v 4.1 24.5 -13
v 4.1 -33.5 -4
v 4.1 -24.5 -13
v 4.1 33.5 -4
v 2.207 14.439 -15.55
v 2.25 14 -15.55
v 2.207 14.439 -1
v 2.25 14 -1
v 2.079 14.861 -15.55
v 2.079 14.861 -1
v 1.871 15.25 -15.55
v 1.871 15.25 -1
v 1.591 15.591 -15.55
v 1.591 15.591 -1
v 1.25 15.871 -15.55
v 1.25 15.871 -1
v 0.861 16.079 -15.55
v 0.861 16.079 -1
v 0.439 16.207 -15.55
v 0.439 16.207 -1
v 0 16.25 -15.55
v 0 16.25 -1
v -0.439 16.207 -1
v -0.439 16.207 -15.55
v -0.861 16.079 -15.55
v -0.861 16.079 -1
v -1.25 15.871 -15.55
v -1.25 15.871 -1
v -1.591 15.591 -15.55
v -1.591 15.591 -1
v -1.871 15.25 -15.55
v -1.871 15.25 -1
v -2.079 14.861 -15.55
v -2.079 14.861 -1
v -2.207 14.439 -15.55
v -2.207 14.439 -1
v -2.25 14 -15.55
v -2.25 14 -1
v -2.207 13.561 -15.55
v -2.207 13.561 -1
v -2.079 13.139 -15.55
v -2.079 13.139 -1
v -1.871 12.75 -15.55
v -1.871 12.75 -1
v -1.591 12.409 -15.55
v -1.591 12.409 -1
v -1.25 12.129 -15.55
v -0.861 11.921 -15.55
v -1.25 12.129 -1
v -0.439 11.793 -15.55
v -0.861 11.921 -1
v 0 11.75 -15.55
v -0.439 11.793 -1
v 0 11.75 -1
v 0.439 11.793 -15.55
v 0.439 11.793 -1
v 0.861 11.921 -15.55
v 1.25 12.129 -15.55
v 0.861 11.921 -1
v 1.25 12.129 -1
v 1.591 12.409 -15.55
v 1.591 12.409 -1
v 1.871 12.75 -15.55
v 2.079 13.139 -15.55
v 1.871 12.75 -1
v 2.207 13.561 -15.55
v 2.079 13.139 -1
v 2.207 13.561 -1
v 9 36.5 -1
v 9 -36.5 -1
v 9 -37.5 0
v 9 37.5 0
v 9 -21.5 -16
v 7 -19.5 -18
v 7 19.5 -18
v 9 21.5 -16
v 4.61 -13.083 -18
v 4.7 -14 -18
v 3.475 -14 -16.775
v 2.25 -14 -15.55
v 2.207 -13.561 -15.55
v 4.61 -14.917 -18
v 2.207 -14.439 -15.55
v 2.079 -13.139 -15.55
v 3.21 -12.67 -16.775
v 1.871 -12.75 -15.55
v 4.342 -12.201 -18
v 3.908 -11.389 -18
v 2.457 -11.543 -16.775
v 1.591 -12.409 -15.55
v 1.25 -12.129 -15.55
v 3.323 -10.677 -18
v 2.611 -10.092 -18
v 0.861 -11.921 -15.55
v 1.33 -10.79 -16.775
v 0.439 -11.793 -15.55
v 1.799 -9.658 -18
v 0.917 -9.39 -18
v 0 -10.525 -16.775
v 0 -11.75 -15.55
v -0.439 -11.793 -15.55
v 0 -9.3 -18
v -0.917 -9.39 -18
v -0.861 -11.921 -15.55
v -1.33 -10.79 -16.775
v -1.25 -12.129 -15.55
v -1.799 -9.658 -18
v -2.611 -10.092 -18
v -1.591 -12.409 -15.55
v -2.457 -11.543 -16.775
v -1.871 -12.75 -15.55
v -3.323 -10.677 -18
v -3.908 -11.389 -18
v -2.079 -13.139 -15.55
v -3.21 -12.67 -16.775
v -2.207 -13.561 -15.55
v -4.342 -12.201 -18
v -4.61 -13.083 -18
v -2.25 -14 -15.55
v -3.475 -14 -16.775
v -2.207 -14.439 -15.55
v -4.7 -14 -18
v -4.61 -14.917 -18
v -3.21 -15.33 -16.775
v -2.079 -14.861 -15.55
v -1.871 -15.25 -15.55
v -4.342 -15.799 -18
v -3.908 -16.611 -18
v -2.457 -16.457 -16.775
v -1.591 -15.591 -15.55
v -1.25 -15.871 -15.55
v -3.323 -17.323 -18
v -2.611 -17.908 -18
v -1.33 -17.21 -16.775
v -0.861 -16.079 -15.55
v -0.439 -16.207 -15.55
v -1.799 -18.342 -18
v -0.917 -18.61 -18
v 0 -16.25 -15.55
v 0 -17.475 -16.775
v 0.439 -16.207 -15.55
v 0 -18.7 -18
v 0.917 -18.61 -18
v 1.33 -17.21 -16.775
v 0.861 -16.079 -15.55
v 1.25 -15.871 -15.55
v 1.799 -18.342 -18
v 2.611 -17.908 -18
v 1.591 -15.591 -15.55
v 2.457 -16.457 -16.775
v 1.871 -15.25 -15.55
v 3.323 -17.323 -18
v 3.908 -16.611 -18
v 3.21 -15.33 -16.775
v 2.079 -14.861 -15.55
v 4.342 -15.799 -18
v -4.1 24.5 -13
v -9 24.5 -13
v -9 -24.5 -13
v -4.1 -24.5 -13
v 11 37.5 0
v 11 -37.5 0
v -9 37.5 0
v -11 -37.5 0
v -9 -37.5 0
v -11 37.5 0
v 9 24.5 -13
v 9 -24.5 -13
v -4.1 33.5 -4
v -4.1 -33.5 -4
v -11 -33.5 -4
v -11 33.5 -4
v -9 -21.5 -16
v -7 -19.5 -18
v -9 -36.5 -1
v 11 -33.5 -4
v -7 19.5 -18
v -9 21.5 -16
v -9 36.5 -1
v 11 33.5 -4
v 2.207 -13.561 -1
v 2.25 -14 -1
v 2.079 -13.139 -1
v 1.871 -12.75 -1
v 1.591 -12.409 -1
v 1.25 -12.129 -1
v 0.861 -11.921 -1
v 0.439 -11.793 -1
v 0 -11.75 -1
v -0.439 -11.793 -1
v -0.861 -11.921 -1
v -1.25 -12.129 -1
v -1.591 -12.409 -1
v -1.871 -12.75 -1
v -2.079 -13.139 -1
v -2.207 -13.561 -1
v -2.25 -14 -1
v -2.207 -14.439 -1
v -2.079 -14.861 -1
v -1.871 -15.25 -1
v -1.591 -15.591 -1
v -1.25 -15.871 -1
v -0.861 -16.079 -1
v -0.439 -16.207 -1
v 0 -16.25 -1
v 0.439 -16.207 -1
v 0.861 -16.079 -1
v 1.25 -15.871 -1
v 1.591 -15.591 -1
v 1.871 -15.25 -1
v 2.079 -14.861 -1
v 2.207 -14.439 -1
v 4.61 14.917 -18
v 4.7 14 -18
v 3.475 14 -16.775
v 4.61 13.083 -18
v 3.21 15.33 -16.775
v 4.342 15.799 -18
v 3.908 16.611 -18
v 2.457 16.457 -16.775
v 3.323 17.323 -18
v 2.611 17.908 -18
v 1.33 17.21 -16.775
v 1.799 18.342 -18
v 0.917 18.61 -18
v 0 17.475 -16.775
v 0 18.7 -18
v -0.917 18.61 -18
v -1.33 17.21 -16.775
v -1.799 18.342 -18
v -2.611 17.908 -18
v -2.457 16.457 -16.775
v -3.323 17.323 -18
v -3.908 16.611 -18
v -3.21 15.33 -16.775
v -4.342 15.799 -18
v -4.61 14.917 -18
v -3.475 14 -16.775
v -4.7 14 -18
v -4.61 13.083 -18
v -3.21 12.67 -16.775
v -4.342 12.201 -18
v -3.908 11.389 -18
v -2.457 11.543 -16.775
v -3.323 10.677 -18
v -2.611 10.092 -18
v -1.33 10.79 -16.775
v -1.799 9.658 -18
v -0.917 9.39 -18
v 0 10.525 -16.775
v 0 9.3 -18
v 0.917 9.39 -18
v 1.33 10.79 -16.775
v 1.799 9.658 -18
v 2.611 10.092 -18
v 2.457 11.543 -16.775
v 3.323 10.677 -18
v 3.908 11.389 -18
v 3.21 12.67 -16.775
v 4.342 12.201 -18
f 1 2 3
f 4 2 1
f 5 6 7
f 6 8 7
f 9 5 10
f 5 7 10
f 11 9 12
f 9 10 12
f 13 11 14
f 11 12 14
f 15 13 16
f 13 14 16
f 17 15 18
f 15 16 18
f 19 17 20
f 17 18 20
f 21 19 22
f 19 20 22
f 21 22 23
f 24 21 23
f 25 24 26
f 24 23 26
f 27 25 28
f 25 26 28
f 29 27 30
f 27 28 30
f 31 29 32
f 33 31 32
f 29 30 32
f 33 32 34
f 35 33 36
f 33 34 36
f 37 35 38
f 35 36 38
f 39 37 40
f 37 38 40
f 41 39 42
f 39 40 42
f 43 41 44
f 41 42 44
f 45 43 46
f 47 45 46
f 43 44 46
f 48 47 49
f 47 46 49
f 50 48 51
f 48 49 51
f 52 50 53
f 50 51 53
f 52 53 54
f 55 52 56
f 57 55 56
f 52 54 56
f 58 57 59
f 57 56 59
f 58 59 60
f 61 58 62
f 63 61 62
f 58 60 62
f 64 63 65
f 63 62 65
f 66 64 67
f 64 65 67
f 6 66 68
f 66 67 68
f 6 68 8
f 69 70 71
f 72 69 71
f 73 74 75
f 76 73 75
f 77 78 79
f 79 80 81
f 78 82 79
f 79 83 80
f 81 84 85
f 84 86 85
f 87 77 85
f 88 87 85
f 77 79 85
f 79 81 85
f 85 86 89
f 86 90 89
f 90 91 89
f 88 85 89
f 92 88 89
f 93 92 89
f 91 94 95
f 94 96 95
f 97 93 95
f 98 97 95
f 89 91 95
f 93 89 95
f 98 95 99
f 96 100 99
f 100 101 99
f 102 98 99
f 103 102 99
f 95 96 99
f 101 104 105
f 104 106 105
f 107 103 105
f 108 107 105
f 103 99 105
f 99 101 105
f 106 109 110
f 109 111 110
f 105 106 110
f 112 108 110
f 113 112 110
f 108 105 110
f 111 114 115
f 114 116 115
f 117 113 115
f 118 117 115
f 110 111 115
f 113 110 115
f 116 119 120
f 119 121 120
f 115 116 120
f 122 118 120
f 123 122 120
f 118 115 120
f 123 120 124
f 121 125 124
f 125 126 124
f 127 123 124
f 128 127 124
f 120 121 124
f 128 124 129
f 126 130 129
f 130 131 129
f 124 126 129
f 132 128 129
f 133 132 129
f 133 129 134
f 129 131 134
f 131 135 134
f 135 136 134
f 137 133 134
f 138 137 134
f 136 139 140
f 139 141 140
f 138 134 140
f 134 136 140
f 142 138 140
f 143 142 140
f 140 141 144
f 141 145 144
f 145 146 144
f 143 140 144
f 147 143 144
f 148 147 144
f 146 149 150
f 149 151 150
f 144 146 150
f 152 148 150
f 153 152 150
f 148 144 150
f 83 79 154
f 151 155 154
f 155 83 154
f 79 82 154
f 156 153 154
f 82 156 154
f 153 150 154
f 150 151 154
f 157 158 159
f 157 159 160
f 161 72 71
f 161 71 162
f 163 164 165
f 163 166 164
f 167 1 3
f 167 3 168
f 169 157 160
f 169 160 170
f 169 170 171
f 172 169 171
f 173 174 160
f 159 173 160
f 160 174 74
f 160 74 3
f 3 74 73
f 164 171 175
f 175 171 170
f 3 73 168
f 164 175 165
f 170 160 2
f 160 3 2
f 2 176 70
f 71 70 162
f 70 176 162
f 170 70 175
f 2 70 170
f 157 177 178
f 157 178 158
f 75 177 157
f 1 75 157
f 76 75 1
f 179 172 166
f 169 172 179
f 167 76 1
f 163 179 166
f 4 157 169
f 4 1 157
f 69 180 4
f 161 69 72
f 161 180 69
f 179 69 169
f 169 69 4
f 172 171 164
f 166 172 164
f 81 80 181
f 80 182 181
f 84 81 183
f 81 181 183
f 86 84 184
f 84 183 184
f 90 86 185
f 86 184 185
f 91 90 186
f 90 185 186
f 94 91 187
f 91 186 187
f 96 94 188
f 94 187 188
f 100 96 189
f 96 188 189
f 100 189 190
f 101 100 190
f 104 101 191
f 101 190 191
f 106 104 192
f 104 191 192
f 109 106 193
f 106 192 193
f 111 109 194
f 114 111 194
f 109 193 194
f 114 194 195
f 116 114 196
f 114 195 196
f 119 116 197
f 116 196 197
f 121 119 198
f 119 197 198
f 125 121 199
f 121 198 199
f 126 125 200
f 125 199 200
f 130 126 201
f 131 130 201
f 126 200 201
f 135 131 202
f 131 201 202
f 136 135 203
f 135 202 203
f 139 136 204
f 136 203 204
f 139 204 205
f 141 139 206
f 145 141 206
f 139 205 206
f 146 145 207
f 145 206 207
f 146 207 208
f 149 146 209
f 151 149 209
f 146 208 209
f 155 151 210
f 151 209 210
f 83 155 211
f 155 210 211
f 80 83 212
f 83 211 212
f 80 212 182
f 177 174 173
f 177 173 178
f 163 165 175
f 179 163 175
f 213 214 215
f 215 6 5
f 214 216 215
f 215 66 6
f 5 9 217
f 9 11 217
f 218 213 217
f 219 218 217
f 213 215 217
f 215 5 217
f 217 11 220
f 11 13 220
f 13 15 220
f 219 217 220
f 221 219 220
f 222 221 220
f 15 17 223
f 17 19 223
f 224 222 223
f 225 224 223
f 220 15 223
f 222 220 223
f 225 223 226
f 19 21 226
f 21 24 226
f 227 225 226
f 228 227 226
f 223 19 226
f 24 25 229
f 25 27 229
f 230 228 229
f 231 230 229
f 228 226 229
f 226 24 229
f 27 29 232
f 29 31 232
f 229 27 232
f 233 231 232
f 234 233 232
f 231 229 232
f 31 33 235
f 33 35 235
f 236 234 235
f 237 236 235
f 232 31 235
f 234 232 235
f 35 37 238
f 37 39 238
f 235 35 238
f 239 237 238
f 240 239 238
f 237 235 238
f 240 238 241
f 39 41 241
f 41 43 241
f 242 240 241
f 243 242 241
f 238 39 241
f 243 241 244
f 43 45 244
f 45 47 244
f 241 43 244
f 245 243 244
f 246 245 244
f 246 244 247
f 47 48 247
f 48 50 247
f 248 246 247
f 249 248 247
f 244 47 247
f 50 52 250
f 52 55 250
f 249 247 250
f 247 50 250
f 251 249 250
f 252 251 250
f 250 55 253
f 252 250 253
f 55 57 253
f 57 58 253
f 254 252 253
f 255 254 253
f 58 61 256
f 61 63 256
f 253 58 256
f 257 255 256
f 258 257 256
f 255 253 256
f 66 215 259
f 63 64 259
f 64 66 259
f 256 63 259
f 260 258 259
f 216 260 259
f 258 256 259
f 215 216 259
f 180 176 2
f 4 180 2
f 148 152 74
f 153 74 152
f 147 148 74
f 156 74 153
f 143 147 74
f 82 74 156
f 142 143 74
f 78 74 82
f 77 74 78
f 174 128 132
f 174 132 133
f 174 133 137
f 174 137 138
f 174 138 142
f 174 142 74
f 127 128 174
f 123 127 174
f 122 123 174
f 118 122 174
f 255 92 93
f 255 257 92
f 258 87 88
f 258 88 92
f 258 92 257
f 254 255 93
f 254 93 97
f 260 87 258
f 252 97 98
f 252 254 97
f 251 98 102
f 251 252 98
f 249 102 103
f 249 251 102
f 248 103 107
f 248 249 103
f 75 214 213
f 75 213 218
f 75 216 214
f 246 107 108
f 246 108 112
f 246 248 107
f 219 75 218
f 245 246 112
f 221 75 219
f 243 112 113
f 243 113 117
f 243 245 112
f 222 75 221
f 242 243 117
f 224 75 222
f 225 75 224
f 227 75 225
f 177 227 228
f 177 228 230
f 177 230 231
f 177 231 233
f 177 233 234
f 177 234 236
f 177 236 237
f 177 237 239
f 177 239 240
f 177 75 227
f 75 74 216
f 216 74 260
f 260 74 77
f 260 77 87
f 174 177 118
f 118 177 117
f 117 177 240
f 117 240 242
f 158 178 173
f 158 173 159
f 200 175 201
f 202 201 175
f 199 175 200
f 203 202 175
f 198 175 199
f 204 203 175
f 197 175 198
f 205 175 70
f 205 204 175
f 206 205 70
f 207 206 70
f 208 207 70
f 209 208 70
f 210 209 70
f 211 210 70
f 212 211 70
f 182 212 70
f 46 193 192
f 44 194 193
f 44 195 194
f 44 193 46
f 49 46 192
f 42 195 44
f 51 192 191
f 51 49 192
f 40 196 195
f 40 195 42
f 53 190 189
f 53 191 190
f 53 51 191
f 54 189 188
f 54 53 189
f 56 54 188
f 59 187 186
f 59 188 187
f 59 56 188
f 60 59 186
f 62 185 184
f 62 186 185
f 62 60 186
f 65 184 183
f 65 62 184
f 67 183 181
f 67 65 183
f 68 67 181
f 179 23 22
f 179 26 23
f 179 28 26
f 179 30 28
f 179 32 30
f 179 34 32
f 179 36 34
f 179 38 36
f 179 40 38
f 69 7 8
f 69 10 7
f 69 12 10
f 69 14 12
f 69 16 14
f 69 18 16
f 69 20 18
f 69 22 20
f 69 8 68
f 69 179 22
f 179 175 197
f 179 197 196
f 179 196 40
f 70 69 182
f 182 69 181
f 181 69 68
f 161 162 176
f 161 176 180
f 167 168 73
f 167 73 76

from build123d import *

# Parameters (mm, degrees)
BOSS_EXTRUDE1_DEPTH                                 = 37.5
CHAMFER1_SIZE                                       = 18
CHAMFER2_SIZE                                       = 2
CSK_FOR_M4_COUNTERSUNK_FLAT_HEAD_SCREW1_D           = 4.5
CSK_FOR_M4_COUNTERSUNK_FLAT_HEAD_SCREW1_CSINK_D     = 9.4
CSK_FOR_M4_COUNTERSUNK_FLAT_HEAD_SCREW1_CSINK_ANGLE = 90


with BuildPart() as part:
    # Sketch1 → Boss-Extrude1 (new, symmetric)
    with BuildSketch(Plane(origin=(0, 0, 0), x_dir=(1, 0, 0), z_dir=(0, 1, 0))):
        Polygon((-9, 1), (9, 1), (9, 0), (11, 0), (11, 4), (4.1, 4), (4.1, 13), (9, 13), (9, 18), (-9, 18), (-9, 13), (-4.1, 13), (-4.1, 4), (-11, 4), (-11, 0), (-9, 0), align=None)
    extrude(amount=BOSS_EXTRUDE1_DEPTH, both=True)

    # Chamfer1
    # the kernel refuses this chamfer: 18 mm, written as the material it takes off along each edge
    with BuildSketch(Plane(origin=(55.290293783, -37.5, -18), x_dir=(0, 0.9996219169112966, -0.02749587661058639), z_dir=(-1, 0, 0))) as chamfer1_piece_1:
        Polygon((CHAMFER1_SIZE * 0.999621916911, -CHAMFER1_SIZE * 0.0274958766106), (-CHAMFER1_SIZE * 0.0274958766106, -CHAMFER1_SIZE * 0.999621916911), (0, 0), align=None)
    extrude(amount=110.580587567, mode=Mode.SUBTRACT)
    with BuildSketch(Plane(origin=(55.290293783, 37.5, -18), x_dir=(0, -0.9996219169112966, -0.02749587661058639), z_dir=(-1, 0, 0))) as chamfer1_piece_2:
        Polygon((CHAMFER1_SIZE * 0.999621916911, CHAMFER1_SIZE * 0.0274958766106), (-CHAMFER1_SIZE * 0.0274958766106, CHAMFER1_SIZE * 0.999621916911), (0, 0), align=None)
    extrude(amount=110.580587567, mode=Mode.SUBTRACT)

    # Chamfer2
    chamfer2_edges = [part.edges().sort_by_distance(p)[0] for p in [
        (-9, 0, -18),
        (9, 0, -18),
    ]]
    chamfer(chamfer2_edges, length=CHAMFER2_SIZE)

    # CSK for M4 Countersunk Flat Head Screw1 (through all)
    with Locations(Plane(origin=(0, 0, -18), x_dir=(-1, 0, 0), z_dir=(0, 0, -1))):
        with Locations((0, 14), (0, -14)):
            CounterSinkHole(CSK_FOR_M4_COUNTERSUNK_FLAT_HEAD_SCREW1_D / 2, CSK_FOR_M4_COUNTERSUNK_FLAT_HEAD_SCREW1_CSINK_D / 2, counter_sink_angle=CSK_FOR_M4_COUNTERSUNK_FLAT_HEAD_SCREW1_CSINK_ANGLE)


solid = part.part
